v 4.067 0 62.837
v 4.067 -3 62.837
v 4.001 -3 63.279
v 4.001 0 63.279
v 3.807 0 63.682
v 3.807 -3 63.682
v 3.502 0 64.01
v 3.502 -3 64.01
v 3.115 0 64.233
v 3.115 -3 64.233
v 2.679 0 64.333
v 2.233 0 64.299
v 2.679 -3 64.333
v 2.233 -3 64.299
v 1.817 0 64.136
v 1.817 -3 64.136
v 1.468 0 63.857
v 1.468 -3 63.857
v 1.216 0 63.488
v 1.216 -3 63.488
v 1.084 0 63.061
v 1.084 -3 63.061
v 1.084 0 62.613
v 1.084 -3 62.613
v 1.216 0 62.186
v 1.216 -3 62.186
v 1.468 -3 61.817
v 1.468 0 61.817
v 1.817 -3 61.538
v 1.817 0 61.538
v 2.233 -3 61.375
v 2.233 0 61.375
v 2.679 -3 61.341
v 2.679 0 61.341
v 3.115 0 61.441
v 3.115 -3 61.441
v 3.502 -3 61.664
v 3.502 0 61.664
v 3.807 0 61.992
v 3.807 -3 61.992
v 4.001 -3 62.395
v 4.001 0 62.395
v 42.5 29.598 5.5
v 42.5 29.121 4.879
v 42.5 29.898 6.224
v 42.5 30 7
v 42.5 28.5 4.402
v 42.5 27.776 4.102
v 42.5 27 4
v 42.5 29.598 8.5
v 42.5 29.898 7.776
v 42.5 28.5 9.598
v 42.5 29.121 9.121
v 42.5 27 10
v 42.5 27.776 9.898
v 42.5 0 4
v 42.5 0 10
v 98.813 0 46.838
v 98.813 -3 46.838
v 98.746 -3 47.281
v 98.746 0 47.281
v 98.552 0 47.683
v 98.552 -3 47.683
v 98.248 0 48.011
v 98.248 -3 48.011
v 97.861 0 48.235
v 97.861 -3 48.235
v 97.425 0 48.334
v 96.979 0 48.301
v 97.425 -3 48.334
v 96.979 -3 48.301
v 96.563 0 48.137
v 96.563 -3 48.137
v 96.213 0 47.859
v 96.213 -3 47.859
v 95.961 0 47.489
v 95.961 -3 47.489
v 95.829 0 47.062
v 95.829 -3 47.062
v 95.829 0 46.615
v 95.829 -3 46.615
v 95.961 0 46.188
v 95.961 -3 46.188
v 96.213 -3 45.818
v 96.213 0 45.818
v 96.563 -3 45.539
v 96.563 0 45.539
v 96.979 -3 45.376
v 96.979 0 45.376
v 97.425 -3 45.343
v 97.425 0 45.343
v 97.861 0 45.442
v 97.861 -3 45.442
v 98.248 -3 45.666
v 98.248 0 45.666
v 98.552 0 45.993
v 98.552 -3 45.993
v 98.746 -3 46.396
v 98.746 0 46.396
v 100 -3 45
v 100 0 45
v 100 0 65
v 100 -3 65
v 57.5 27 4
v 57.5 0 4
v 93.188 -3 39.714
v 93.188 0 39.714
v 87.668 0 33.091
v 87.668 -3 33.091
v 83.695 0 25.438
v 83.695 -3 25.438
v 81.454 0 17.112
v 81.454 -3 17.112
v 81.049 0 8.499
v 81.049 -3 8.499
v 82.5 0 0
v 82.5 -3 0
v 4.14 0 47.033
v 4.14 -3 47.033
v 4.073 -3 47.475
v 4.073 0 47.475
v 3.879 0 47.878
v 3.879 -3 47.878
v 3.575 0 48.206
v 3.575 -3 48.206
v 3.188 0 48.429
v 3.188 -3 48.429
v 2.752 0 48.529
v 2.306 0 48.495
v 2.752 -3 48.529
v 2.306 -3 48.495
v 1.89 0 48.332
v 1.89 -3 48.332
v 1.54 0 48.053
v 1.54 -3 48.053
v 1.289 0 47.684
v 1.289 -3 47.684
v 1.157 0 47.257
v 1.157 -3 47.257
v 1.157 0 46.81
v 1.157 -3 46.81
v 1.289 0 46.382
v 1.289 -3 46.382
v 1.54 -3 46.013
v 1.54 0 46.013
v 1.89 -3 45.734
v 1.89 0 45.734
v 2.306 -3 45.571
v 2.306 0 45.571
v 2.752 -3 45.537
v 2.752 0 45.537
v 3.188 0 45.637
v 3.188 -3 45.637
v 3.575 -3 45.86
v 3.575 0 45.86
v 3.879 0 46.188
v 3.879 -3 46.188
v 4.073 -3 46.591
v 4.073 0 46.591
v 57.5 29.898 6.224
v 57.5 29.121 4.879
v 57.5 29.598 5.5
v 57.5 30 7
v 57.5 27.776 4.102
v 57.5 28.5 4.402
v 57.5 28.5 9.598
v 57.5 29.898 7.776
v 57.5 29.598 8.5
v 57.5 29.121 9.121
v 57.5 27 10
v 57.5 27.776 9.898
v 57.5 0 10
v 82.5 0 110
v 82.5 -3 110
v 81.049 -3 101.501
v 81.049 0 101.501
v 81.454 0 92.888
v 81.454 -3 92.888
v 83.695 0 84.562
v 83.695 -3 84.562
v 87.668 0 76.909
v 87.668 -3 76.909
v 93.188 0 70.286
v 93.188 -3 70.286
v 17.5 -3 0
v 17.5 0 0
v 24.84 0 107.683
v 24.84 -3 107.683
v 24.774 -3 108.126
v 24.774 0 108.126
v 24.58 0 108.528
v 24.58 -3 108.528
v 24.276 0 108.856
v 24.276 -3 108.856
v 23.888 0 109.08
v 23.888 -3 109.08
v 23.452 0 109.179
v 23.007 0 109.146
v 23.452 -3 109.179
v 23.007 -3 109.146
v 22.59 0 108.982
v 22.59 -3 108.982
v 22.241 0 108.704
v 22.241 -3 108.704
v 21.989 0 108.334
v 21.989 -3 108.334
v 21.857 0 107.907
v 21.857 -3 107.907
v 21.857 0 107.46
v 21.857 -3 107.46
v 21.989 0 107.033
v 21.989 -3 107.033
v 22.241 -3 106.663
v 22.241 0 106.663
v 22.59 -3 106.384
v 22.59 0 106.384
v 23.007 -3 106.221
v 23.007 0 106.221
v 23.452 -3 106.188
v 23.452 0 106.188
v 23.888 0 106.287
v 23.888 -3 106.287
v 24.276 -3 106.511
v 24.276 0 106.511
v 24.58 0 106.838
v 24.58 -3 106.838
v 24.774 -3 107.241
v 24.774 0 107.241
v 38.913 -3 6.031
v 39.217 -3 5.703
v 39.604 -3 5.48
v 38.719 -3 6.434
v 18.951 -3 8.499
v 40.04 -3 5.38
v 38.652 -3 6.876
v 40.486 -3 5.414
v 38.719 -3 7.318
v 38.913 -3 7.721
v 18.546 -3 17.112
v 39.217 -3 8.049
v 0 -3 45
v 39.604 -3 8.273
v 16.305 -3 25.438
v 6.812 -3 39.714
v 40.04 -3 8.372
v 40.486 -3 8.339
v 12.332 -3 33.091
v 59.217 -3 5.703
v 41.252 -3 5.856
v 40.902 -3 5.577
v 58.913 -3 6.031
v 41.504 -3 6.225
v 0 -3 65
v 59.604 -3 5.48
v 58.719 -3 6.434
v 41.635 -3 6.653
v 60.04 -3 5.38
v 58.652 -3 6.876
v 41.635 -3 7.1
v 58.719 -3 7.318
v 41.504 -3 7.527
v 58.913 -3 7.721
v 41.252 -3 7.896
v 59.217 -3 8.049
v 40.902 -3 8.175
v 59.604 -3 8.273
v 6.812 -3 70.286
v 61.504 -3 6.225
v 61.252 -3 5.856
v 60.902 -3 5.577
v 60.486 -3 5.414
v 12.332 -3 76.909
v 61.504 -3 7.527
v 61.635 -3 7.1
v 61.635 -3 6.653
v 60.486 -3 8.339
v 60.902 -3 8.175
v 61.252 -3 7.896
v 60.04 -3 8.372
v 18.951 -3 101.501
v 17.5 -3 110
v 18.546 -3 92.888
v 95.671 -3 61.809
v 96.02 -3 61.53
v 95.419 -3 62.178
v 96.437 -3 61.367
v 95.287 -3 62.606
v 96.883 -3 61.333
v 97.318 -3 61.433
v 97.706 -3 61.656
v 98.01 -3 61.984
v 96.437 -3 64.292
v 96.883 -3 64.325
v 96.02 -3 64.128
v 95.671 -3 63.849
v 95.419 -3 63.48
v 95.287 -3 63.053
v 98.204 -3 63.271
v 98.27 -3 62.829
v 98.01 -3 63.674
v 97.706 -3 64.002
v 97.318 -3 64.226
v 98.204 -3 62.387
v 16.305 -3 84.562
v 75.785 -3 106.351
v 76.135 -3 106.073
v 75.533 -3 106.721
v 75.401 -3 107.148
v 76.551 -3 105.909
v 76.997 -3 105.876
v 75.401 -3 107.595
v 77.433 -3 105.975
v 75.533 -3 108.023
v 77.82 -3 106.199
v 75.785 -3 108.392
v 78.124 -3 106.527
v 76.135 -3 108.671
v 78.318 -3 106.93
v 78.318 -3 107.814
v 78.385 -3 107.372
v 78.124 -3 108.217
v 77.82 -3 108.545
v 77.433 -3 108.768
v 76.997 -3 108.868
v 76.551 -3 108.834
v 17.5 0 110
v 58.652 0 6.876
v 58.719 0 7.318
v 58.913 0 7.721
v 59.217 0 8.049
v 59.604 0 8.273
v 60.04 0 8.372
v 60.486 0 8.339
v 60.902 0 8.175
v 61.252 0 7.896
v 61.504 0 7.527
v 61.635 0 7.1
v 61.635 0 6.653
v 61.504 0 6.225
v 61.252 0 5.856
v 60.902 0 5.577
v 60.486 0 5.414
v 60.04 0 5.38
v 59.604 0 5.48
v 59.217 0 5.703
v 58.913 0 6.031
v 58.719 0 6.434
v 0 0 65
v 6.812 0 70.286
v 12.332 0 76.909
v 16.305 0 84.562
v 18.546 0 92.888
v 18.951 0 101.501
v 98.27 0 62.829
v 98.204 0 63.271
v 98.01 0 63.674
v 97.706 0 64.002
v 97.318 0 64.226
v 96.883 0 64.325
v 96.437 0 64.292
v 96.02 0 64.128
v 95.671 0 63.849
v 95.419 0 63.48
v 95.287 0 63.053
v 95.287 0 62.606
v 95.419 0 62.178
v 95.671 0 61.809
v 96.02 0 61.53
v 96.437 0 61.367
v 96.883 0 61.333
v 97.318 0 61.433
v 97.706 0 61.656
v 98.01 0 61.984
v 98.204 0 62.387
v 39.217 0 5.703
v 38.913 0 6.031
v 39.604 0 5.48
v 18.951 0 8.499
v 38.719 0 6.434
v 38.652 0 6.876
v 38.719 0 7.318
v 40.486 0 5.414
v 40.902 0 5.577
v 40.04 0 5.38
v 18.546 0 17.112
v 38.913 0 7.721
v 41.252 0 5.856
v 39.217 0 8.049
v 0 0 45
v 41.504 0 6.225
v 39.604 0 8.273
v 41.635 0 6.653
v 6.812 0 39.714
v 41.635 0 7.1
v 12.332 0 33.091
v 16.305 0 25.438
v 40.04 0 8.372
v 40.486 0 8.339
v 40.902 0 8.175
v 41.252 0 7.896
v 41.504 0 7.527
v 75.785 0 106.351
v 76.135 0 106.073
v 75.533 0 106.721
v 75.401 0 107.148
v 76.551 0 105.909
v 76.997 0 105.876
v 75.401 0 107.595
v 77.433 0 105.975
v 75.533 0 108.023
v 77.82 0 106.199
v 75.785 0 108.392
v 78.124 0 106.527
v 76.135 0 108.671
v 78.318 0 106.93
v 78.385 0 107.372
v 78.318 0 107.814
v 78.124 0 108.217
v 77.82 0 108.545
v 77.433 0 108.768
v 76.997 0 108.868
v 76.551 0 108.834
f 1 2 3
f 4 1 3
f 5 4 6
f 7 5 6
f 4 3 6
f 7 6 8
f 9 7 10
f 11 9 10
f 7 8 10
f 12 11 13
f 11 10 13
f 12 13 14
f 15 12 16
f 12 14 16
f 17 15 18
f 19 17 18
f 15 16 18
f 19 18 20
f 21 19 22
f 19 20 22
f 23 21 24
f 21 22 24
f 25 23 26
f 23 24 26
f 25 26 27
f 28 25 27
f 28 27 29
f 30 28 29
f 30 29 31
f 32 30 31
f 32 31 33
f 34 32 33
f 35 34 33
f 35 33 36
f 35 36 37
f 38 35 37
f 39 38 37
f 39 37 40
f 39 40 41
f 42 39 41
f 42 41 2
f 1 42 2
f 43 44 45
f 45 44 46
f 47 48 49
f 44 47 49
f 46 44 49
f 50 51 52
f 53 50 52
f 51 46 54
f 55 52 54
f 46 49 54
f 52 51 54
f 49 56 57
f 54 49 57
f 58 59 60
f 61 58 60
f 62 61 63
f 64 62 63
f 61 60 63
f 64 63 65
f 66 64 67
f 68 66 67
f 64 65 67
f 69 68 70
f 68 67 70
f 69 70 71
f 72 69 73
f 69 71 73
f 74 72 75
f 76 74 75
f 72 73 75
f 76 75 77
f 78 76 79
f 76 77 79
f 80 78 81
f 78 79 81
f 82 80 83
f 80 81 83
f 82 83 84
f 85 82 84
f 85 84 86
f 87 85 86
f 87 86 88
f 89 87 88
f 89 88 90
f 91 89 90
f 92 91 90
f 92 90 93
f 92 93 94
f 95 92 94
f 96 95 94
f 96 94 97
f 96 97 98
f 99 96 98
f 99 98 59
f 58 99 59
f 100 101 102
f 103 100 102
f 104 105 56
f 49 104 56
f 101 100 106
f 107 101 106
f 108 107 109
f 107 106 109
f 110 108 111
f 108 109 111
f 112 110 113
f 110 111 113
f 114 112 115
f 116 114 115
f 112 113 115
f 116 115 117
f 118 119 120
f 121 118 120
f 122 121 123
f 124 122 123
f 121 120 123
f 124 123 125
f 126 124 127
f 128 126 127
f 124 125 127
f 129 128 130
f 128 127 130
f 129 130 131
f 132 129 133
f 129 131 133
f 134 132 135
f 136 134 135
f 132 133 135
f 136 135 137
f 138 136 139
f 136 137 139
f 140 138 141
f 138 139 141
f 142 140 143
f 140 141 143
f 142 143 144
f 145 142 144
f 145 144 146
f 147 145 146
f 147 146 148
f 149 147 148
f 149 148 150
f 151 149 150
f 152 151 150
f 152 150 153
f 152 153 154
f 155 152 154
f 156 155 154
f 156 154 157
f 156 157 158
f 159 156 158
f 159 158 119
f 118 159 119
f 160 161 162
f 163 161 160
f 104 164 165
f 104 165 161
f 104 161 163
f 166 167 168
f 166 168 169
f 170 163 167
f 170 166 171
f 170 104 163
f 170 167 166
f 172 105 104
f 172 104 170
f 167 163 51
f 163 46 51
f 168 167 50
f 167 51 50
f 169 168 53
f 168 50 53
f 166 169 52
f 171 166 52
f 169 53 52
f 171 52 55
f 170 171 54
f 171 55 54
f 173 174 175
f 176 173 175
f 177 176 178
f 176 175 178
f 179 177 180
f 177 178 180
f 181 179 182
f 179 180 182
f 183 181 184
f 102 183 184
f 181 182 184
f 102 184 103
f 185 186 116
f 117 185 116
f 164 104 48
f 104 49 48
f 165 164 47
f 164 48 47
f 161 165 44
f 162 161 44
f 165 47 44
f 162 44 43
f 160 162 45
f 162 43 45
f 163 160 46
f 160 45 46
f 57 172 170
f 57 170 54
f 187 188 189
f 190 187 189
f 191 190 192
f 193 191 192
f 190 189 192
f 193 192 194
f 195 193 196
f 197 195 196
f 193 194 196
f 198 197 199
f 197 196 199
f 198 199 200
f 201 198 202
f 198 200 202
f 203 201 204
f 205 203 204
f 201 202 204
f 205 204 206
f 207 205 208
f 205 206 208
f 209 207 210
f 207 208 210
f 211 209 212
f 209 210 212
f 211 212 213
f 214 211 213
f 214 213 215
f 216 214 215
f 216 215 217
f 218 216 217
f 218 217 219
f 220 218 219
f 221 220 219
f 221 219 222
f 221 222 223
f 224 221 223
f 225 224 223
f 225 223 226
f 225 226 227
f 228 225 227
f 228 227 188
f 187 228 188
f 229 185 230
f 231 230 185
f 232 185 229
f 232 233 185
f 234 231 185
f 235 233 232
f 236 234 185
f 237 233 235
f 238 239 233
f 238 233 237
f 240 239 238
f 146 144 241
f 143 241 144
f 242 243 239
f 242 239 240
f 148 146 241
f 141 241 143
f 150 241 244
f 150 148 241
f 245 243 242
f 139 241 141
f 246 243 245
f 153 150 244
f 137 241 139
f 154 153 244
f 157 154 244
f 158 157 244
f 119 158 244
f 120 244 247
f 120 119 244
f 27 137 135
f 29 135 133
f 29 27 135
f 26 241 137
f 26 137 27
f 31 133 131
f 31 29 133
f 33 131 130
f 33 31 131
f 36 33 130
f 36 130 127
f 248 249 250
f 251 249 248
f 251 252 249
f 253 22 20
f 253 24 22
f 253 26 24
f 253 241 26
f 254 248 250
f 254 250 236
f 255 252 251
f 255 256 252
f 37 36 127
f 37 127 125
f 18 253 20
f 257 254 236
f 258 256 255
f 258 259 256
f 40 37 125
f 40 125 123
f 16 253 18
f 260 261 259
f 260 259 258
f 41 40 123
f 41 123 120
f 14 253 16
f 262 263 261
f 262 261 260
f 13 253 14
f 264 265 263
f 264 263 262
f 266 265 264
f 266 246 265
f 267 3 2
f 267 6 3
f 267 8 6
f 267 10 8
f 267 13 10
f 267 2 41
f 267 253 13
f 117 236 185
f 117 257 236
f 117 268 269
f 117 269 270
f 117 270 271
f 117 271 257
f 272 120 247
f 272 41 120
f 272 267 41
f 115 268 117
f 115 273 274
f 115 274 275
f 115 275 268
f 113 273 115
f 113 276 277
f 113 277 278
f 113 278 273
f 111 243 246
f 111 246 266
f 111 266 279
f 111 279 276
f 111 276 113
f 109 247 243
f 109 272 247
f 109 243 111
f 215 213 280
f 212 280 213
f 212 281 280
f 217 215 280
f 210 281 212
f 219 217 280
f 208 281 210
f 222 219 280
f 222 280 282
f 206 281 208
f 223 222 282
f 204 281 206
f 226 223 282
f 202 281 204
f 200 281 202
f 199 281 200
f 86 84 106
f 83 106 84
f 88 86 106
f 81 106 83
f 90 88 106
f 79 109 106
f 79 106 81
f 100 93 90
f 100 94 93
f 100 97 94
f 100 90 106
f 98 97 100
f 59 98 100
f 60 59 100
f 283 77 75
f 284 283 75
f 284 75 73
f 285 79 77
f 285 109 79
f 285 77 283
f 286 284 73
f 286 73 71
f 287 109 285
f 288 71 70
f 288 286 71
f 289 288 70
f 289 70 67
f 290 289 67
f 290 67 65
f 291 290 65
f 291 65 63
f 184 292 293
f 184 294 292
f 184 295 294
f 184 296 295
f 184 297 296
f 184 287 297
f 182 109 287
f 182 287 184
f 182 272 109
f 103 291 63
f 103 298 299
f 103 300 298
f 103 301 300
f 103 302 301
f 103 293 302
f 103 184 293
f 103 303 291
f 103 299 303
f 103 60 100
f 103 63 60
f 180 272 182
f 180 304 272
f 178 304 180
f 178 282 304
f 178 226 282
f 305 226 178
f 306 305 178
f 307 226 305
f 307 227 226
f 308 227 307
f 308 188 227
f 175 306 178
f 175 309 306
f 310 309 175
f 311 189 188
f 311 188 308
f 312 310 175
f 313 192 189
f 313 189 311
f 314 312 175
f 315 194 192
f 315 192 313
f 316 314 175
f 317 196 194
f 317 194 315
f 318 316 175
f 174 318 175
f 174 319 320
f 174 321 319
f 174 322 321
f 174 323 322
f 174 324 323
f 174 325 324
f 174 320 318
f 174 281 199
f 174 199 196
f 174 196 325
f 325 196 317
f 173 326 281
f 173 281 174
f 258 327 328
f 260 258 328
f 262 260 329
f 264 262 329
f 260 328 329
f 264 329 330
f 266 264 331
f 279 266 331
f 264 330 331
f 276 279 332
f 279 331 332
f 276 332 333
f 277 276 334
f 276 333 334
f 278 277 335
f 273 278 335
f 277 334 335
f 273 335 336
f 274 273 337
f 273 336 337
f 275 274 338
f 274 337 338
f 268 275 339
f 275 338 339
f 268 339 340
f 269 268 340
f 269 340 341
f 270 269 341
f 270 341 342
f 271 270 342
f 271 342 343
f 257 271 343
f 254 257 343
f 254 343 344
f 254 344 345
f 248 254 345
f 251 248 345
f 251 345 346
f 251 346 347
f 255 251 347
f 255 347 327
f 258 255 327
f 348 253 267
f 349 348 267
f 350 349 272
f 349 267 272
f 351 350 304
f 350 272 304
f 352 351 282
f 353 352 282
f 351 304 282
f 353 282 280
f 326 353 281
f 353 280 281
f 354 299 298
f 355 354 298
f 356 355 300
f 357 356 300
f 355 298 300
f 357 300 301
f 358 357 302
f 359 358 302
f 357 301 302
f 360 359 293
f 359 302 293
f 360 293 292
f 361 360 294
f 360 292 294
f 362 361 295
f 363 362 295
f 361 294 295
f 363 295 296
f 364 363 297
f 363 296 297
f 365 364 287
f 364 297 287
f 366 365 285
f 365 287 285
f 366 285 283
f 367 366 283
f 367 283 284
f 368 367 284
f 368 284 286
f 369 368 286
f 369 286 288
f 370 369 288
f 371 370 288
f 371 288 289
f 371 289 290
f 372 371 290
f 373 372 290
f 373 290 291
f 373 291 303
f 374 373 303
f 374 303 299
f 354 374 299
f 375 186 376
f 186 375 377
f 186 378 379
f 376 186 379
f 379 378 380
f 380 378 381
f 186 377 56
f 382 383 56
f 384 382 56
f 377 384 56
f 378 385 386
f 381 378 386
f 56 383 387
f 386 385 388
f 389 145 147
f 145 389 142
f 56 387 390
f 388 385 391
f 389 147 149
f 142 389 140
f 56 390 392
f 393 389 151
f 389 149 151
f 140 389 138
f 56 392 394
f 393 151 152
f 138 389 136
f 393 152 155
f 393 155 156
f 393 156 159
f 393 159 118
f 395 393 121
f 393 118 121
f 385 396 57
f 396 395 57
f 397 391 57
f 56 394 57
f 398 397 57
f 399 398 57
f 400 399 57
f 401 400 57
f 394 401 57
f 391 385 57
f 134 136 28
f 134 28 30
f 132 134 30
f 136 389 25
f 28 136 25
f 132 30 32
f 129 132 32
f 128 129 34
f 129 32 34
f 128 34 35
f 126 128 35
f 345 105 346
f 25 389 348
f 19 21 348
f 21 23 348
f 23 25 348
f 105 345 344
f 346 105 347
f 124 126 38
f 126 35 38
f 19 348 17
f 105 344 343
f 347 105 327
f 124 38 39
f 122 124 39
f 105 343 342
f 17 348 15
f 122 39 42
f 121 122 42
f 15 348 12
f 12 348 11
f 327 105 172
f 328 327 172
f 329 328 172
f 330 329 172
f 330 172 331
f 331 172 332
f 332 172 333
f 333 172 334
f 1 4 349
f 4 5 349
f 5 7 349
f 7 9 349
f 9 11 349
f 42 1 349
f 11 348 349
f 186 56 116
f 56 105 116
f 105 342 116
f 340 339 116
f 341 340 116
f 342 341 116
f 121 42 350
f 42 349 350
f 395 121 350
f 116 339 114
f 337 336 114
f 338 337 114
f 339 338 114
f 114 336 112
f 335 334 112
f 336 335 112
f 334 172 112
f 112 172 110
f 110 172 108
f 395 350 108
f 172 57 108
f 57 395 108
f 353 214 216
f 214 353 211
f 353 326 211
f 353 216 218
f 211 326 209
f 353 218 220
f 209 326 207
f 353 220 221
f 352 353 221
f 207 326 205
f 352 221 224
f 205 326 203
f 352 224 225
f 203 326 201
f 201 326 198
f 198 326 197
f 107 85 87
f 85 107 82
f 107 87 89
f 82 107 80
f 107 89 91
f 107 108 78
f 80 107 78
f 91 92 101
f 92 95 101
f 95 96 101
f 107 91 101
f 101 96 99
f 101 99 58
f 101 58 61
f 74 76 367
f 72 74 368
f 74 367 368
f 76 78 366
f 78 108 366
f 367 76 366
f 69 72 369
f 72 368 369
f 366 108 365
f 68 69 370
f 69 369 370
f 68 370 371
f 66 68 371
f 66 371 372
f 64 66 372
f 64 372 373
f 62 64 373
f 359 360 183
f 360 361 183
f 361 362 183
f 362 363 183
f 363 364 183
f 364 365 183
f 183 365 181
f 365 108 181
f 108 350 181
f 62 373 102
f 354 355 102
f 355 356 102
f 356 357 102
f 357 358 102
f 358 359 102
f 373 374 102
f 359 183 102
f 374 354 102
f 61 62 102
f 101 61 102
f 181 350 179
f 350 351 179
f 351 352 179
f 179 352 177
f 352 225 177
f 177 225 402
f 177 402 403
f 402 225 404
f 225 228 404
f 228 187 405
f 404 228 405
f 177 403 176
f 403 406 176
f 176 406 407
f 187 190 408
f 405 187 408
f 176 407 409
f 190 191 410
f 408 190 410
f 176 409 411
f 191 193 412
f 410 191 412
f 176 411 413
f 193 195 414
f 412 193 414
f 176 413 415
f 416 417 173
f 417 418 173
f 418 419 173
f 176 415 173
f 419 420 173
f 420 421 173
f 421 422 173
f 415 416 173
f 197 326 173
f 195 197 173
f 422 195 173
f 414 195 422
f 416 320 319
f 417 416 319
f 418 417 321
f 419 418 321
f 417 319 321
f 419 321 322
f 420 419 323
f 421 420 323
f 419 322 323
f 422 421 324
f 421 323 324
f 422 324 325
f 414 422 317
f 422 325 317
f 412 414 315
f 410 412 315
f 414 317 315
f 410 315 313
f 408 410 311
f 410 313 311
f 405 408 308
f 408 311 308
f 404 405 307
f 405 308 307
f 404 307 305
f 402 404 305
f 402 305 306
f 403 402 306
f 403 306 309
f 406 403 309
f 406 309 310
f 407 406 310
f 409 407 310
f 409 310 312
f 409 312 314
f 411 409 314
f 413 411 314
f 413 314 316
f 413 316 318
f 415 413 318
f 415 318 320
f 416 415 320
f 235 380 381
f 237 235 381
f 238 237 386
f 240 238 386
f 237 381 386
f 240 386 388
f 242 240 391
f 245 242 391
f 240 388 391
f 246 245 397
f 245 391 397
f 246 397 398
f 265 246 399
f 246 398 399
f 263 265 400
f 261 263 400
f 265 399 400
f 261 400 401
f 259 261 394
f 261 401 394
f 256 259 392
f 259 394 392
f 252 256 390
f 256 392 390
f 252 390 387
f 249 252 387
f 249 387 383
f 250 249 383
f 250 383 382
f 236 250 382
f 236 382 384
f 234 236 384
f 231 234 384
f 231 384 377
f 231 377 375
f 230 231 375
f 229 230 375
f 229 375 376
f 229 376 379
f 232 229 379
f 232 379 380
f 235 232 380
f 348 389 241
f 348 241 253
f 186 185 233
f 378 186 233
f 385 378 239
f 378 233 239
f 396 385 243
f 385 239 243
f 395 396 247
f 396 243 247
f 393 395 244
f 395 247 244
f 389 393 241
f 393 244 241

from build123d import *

# Parameters (mm, degrees)
F0_W      = 100
F0_H      = 110
F1_DEPTH  = 3
F3_DEPTH  = 25
F4_W      = 15
F4_H      = 6
F5_DEPTH  = 30
F6_R      = 3
F7_R      = 2.99999
F8_R      = 1.5
F9_DEPTH  = 25
F10_R     = 1.5
F11_DEPTH = 25
F12_R     = 1.5
F13_DEPTH = 25
F14_R     = 1.5
F15_DEPTH = 25


# Not quite as in the source:
# - a fillet or chamfer is up to 0.001 mm smaller than in the source, because OpenCascade refuses the exact size


with BuildPart() as f1:
    # F0 (on Front) → F1 (new body)
    with BuildSketch(Plane.XZ):
        with Locations((50, 55)):
            Rectangle(F0_W, F0_H)
    extrude(amount=F1_DEPTH)

    # F2 (on face) → F3 (cut)
    with BuildSketch(Plane.XZ.offset(3)):
        with BuildLine():
            Line((0, 110), (0, 65))
            ThreePointArc((0, 65), (16.3054104548, 84.5617848231), (17.5, 110))
            Line((17.5, 110), (0, 110))
        make_face()
        with BuildLine():
            Line((100, 110), (82.5, 110))
            ThreePointArc((82.5, 110), (83.6945895452, 84.5617848231), (100, 65))
            Line((100, 65), (100, 110))
        make_face()
        with BuildLine():
            ThreePointArc((100, 45), (83.6945895452, 25.4382151769), (82.5, 0))
            Line((82.5, 0), (100, 0))
            Line((100, 0), (100, 45))
        make_face()
        with BuildLine():
            Line((0, 45), (0, 0))
            Line((0, 0), (17.5, 0))
            ThreePointArc((17.5, 0), (16.3054104548, 25.4382151769), (0, 45))
        make_face()
    extrude(amount=-F3_DEPTH, mode=Mode.SUBTRACT)

    # F4 (on face) → F5 (join)
    with BuildSketch(Plane(origin=(0, 0, 0), x_dir=(-1, 0, 0), z_dir=(0, 1, 0))):
        with Locations((-50, 7)):
            Rectangle(F4_W, F4_H)
    extrude(amount=F5_DEPTH)

    # F6
    f6_edges = [f1.edges().sort_by_distance(p)[0] for p in [
        (50, 30, 4),
    ]]
    fillet(f6_edges, radius=F6_R)

    # F7 (radius 3 in the source; OpenCascade refuses exactly that, so slightly less here)
    f7_edges = [f1.edges().sort_by_distance(p)[0] for p in [
        (50, 30, 10),
    ]]
    fillet(f7_edges, radius=F7_R)

    # F8 (on face) → F9 (cut)
    with BuildSketch(Plane(origin=(0, 0, 0), x_dir=(-1, 0, 0), z_dir=(0, 1, 0))):
        with Locations((-40.1520836353, 6.8762069568)):
            Circle(F8_R)
        with Locations((-60.1520836353, 6.8762069568)):
            Circle(F8_R)
    extrude(amount=-F9_DEPTH, mode=Mode.SUBTRACT)

    # F10 (on face) → F11 (cut)
    with BuildSketch(Plane.XZ.offset(3)):
        with Locations((23.3403220773, 107.6833680272)):
            Circle(F10_R)
        with Locations((76.8845230341, 107.3717549443)):
            Circle(F10_R)
    extrude(amount=-F11_DEPTH, mode=Mode.SUBTRACT)

    # F12 (on face) → F13 (cut)
    with BuildSketch(Plane.XZ.offset(3)):
        with Locations((96.7704804272, 62.8292252972)):
            Circle(F12_R)
        with Locations((97.3125401127, 46.8384100805)):
            Circle(F12_R)
        with Locations((2.5671770603, 62.836966732)):
            Circle(F12_R)
    extrude(amount=-F13_DEPTH, mode=Mode.SUBTRACT)

    # F14 (on face) → F15 (cut)
    with BuildSketch(Plane.XZ.offset(3)):
        with Locations((2.6400329079, 47.0330864191)):
            Circle(F14_R)
    extrude(amount=-F15_DEPTH, mode=Mode.SUBTRACT)


solid = f1.part
